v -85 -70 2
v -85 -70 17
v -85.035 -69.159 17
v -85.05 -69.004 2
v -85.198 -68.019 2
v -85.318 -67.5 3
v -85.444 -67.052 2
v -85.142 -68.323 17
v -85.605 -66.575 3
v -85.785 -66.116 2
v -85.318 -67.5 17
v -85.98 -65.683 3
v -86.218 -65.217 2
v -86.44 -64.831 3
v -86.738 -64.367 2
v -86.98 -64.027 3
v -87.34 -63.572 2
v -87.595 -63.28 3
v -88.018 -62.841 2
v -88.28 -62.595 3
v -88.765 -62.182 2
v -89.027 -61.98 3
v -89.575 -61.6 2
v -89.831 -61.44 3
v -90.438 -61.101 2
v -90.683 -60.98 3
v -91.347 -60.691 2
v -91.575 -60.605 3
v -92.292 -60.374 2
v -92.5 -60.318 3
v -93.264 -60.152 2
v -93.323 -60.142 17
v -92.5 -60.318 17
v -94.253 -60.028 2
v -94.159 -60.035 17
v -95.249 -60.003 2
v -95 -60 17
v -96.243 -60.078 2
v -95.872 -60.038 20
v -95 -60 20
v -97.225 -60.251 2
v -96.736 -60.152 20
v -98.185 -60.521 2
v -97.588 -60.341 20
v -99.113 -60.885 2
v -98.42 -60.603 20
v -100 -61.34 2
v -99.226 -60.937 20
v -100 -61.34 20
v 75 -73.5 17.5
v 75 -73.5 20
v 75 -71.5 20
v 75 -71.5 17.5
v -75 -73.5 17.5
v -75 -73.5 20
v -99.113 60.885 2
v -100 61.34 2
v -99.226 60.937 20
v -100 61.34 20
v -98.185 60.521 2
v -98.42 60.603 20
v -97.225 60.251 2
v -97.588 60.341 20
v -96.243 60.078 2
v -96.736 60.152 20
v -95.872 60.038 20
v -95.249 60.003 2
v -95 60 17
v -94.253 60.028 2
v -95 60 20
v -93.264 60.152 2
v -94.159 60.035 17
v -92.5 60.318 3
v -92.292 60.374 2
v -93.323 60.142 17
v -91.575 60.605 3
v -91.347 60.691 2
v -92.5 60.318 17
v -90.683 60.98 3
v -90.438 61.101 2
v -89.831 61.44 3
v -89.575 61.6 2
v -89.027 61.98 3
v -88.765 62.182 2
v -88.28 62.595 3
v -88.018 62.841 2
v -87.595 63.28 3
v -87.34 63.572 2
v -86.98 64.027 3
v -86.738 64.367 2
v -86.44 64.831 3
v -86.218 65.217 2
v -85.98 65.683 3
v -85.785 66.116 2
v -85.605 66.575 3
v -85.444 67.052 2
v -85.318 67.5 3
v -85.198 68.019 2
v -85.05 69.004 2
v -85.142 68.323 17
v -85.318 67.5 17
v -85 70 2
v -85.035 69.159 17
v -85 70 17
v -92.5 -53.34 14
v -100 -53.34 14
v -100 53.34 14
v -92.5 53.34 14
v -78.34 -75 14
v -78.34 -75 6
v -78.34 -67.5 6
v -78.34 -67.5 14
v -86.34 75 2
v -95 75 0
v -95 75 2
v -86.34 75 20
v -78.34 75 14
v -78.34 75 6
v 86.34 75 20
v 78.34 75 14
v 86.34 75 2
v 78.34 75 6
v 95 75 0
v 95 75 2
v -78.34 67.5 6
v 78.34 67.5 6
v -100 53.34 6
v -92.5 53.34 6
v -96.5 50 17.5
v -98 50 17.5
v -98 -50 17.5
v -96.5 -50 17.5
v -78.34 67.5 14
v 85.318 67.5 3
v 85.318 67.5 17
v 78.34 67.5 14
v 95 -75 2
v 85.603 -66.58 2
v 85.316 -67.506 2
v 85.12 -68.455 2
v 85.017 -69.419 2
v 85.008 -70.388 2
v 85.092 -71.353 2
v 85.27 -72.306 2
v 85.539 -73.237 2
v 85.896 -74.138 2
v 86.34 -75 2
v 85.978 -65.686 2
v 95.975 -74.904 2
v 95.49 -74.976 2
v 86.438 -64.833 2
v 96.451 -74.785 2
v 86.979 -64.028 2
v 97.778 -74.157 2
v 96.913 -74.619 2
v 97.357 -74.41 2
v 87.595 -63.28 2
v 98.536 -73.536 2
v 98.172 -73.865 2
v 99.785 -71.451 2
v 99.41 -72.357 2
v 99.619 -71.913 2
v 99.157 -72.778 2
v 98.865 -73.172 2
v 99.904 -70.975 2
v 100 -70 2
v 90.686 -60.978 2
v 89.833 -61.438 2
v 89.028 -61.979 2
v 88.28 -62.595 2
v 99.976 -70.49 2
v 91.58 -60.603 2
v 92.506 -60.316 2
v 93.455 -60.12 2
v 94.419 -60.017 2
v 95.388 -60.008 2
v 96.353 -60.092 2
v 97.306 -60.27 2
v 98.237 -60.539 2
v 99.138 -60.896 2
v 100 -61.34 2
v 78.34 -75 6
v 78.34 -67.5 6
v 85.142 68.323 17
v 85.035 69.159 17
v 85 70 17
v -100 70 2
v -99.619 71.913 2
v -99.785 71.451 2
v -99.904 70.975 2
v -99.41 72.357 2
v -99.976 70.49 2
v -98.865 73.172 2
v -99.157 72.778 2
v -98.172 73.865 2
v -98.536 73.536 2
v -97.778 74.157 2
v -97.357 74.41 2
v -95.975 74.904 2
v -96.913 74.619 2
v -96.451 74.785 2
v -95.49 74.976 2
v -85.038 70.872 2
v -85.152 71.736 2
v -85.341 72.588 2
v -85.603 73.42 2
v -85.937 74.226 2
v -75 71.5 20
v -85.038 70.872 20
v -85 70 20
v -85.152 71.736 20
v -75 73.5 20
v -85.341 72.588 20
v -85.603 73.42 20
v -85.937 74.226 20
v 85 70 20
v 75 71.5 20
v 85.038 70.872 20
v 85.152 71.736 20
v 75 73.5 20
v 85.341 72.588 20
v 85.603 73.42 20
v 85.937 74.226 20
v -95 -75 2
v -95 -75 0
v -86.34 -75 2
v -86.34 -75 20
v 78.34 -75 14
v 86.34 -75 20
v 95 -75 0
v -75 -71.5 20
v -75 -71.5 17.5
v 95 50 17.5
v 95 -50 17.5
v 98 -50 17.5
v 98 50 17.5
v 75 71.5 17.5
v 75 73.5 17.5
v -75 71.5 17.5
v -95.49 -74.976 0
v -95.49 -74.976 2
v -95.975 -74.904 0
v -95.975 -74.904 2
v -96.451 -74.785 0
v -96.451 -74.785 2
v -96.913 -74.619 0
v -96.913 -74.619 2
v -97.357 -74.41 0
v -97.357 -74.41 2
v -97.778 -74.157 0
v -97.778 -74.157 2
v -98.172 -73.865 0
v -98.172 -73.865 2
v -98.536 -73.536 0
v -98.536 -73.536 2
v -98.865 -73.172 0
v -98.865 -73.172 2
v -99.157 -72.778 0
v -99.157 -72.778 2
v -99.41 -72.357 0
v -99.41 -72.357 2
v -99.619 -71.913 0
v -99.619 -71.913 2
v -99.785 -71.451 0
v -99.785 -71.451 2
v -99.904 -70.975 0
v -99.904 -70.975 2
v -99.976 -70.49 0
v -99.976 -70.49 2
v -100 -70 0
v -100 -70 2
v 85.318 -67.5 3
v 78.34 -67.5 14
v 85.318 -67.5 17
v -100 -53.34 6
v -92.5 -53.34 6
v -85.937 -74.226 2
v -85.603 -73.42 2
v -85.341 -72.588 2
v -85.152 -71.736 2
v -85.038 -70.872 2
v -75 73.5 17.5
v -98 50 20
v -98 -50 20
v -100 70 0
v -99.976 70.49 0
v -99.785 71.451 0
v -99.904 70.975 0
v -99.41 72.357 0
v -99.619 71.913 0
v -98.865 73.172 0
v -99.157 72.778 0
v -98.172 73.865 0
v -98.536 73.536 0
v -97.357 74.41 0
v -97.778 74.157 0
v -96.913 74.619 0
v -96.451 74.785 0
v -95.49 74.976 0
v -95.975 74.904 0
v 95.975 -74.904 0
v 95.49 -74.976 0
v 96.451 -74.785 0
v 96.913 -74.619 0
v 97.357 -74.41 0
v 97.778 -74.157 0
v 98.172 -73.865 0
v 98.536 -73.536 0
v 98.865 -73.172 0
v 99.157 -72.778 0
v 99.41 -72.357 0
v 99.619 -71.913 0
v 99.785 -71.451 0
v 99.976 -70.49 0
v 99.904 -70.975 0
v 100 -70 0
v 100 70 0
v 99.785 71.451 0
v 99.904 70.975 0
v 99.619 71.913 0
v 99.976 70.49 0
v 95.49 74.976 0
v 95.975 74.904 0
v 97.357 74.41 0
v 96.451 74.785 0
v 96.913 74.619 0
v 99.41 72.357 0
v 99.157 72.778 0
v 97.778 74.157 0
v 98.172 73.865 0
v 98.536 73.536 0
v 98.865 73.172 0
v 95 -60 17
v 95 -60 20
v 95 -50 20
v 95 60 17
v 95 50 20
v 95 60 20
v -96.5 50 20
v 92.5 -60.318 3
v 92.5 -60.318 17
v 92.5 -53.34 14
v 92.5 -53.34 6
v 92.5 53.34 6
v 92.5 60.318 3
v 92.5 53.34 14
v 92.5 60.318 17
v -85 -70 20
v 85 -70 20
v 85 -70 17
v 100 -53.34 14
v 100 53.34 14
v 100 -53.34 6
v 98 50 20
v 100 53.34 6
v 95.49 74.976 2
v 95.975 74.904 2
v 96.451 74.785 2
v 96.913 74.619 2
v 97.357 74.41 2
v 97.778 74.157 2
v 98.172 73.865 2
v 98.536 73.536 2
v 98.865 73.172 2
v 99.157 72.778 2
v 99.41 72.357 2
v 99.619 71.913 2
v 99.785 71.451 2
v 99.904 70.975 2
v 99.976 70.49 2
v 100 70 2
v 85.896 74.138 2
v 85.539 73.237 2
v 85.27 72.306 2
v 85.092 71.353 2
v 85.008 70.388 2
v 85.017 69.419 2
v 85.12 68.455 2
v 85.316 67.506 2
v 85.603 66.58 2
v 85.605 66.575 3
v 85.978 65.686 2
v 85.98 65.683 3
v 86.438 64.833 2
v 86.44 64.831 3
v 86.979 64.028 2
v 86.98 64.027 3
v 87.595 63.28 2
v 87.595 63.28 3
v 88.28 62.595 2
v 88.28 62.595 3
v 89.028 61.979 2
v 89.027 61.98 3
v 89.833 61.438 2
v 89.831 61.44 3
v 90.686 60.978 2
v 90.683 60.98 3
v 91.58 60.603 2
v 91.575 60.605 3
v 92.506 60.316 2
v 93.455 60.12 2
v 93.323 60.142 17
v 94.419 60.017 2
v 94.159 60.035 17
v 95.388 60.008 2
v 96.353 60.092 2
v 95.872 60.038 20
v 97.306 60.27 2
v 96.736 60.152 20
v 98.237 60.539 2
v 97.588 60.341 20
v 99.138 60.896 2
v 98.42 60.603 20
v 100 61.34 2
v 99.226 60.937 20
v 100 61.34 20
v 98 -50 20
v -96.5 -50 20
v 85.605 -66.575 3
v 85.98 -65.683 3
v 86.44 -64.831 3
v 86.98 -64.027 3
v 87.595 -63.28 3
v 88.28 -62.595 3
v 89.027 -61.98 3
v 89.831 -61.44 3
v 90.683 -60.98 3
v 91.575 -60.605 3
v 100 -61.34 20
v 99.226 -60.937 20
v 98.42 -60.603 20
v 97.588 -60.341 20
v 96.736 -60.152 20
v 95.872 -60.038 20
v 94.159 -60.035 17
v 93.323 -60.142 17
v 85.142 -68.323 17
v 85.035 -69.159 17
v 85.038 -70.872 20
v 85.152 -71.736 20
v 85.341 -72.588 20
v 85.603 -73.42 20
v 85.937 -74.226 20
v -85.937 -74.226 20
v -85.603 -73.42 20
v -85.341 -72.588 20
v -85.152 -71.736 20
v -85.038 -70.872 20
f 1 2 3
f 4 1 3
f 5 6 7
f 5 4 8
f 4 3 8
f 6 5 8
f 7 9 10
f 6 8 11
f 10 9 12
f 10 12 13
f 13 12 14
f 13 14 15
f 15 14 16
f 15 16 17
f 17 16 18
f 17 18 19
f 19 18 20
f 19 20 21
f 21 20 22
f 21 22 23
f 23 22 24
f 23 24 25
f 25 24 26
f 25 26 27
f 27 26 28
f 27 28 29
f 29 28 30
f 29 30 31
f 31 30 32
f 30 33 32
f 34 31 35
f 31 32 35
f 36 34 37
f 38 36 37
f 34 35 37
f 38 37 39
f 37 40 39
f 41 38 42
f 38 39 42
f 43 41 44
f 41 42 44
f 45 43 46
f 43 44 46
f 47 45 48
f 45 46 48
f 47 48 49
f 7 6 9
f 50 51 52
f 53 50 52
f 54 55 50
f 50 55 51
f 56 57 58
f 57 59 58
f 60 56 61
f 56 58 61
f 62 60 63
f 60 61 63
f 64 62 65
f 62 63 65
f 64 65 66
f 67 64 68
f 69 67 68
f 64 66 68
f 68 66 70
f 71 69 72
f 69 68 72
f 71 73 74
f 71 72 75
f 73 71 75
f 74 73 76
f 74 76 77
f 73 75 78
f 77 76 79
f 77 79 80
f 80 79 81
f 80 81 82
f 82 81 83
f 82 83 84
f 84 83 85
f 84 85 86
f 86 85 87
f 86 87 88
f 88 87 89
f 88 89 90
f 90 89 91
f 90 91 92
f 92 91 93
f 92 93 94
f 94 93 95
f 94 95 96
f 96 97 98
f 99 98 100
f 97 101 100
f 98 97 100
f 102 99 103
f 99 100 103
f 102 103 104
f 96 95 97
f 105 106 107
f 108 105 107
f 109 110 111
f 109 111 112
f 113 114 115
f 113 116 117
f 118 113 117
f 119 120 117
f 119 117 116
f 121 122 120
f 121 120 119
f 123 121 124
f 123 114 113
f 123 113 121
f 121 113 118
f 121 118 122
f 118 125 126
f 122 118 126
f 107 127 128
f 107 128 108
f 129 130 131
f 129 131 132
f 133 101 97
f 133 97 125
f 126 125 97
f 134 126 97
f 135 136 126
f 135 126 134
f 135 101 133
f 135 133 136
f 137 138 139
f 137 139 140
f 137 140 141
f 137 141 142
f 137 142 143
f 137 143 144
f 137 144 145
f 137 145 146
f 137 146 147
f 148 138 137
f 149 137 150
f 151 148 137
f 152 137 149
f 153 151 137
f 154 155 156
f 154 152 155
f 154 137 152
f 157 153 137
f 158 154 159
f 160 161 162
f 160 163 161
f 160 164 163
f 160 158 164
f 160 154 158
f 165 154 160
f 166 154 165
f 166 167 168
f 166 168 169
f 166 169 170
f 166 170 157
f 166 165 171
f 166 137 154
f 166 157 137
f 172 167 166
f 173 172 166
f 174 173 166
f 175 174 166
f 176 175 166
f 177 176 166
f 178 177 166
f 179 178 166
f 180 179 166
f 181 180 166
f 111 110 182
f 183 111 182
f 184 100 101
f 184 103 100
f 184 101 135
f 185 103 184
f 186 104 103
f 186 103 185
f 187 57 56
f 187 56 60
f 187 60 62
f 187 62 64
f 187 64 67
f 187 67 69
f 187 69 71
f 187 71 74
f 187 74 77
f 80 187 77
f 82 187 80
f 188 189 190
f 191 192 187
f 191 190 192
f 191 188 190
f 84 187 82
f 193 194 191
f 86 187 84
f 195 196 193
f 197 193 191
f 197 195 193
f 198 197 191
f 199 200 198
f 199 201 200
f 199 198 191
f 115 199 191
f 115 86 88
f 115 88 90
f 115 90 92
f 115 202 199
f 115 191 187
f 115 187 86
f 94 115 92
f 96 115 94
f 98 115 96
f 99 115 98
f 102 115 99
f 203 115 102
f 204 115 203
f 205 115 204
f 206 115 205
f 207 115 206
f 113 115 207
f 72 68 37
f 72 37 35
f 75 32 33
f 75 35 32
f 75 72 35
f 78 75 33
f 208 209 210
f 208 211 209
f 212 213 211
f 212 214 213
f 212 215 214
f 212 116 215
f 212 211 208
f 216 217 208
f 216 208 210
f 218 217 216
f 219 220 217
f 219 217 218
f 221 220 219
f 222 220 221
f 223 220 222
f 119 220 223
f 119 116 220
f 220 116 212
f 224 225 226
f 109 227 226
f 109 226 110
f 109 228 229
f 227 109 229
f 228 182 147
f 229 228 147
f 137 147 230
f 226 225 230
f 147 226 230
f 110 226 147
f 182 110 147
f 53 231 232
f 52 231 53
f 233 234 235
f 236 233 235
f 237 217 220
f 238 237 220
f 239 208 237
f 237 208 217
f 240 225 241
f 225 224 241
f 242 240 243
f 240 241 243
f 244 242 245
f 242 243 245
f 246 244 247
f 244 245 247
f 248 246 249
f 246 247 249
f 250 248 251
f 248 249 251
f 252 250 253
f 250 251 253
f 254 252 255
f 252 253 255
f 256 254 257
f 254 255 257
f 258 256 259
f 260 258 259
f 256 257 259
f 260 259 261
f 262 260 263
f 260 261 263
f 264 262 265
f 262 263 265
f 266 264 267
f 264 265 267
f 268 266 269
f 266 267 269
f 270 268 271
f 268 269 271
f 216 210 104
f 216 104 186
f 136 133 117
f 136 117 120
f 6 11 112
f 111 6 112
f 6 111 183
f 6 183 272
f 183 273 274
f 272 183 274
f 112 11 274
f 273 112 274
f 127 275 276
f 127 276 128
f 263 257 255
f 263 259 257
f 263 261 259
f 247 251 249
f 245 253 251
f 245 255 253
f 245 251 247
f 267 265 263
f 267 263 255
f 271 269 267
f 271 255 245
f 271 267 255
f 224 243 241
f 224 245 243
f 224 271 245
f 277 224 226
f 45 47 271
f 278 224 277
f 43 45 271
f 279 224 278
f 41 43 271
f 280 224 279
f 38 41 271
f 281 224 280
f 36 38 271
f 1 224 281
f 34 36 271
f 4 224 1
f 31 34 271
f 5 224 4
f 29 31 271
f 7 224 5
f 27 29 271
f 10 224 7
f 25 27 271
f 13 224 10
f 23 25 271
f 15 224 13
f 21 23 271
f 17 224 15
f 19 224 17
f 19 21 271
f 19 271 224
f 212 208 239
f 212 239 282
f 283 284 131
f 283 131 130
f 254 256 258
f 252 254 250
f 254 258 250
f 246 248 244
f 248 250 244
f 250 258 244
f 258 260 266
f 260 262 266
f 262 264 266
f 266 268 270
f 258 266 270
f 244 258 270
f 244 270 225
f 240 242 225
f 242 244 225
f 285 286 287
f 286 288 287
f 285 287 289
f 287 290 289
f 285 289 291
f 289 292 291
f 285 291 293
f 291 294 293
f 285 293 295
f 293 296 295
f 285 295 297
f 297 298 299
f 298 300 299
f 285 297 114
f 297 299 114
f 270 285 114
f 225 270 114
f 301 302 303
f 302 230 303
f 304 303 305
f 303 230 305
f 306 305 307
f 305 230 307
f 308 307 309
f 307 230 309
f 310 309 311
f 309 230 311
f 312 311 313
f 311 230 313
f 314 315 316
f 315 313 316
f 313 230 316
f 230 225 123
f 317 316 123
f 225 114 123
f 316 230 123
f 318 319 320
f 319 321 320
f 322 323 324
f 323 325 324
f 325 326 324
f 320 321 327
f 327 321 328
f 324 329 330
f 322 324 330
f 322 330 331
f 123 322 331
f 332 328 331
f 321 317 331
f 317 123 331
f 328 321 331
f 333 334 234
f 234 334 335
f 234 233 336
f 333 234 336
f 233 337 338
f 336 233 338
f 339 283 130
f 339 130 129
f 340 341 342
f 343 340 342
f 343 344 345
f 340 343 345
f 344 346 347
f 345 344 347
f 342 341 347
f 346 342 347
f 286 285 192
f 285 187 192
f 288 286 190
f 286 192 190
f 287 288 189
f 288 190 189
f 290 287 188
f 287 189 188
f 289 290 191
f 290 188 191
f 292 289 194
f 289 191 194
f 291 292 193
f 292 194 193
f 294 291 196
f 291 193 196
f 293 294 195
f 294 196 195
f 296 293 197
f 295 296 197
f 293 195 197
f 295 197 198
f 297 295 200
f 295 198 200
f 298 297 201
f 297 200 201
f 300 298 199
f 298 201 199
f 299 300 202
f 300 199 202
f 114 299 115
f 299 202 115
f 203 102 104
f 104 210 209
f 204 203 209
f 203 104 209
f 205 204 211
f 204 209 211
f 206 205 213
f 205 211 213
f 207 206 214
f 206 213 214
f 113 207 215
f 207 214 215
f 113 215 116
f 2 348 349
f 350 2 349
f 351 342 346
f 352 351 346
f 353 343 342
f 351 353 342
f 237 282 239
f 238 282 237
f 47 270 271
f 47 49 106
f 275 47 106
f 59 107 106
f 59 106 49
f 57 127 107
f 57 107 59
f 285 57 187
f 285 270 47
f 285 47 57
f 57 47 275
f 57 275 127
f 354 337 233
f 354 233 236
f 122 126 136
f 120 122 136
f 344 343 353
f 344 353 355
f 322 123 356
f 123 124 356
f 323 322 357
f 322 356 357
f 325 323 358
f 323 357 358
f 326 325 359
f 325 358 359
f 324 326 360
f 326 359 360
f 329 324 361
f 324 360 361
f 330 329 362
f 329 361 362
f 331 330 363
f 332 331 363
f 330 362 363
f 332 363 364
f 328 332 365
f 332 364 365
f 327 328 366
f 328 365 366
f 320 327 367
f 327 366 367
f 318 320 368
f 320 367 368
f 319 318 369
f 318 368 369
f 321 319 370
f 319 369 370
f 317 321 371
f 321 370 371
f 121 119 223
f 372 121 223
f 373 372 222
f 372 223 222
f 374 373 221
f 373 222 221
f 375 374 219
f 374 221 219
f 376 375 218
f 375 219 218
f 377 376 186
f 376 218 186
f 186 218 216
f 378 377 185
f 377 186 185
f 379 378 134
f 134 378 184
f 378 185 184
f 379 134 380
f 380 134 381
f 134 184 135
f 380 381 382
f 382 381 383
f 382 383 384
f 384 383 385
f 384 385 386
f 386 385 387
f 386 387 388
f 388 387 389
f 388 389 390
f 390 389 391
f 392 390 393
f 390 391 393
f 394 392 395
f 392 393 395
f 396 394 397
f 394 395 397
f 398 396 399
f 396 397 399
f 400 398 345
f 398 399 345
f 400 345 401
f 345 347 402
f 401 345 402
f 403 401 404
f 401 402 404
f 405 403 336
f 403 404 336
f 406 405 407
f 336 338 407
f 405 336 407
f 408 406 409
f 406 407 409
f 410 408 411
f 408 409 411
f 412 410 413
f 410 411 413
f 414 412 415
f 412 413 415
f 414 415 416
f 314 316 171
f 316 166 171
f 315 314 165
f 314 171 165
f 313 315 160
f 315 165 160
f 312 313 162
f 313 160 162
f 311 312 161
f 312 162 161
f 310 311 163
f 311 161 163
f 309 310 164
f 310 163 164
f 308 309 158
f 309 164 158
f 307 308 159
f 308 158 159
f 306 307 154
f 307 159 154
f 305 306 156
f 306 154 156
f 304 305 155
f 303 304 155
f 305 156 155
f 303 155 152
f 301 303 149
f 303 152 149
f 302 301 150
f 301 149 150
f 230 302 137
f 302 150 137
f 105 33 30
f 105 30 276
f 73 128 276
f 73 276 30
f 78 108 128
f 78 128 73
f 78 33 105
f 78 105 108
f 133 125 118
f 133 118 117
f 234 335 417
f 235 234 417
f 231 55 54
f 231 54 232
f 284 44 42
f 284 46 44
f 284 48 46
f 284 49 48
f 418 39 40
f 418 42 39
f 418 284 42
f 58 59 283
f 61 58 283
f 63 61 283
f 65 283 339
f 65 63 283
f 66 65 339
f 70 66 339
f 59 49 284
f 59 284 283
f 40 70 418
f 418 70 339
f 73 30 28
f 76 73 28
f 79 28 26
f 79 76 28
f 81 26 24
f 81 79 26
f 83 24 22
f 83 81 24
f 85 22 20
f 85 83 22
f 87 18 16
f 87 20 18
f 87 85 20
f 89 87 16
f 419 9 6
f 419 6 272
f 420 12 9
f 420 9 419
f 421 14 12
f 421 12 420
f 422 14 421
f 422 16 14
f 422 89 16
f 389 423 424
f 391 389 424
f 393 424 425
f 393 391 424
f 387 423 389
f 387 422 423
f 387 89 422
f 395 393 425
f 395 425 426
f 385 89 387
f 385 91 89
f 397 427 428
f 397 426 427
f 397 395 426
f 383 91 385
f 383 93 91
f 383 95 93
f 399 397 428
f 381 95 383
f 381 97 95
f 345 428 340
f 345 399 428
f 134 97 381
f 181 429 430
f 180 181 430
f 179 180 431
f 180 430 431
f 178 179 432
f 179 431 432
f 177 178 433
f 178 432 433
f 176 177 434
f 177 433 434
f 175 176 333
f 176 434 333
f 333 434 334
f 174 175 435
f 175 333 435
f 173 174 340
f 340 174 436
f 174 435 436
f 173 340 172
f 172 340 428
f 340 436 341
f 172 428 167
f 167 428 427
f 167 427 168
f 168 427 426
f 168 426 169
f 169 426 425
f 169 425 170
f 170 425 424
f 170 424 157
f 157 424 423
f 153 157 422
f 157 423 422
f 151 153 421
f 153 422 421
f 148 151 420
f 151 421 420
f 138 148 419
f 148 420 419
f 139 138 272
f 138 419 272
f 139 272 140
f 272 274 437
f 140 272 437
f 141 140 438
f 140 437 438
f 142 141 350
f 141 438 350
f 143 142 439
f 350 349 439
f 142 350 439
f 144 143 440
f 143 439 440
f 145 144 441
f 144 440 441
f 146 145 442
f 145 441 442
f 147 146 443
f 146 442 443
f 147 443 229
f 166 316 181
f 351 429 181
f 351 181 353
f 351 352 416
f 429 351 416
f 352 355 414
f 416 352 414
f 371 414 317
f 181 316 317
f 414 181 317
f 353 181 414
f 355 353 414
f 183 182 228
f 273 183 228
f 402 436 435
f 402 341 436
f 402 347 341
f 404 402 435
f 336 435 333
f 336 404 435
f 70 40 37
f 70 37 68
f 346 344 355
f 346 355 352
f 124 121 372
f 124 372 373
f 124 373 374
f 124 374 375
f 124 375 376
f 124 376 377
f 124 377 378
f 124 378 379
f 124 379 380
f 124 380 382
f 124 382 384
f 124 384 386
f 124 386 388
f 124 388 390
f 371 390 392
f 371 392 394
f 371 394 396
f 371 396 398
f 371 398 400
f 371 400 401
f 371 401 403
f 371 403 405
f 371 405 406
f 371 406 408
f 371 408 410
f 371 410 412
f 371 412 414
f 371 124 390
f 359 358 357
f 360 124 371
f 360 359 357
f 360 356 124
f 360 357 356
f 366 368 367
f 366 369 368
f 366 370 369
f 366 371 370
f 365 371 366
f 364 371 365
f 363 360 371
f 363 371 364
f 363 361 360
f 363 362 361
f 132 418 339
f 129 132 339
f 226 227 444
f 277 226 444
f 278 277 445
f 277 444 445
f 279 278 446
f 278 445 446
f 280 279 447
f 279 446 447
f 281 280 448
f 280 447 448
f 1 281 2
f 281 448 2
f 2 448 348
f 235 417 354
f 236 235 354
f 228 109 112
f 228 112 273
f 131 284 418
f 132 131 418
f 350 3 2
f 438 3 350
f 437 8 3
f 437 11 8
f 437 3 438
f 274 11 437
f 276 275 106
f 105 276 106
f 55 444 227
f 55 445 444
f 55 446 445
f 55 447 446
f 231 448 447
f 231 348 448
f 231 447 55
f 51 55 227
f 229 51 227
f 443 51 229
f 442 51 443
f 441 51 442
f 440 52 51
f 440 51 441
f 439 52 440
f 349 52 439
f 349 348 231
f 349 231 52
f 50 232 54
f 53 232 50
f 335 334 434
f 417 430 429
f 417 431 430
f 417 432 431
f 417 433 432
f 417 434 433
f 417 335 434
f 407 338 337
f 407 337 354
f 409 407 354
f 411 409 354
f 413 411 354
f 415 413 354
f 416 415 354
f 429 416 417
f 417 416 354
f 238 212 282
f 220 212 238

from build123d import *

# Parameters (mm, degrees)
ESBO_O1_W                = 200
ESBO_O1_H                = 150
RESSALTO_EXTRUS_O1_DEPTH = 20
ESBO_O4_W                = 185
ESBO_O4_H                = 135
CORTE_EXTRUS_O2_DEPTH    = 17
ESBO_O3_W                = 190
ESBO_O3_H                = 140
CORTE_EXTRUS_O3_DEPTH    = 3
ESBO_O6_R                = 10
CORTE_EXTRUS_O4_DEPTH    = 18
FILETE4_R                = 5
FILETE5_R                = 5
FILETE6_R                = 5
FILETE7_R                = 5
ESBO_O7_W                = 156.679491924
ESBO_O7_H                = 8
CORTE_EXTRUS_O5_DEPTH    = 300
ESBO_O8_W                = 8
ESBO_O8_H                = 106.679491924
CORTE_EXTRUS_O6_DEPTH    = 300
ESBO_O15_W               = 1.5
ESBO_O15_H               = 100
ESBO_O15_W_2             = 150
ESBO_O15_H_2             = 2
ESBO_O15_W_3             = 3.5
CORTE_EXTRUS_O7_DEPTH    = 2.5


with BuildPart() as part:
    # Esboço1 → Ressalto-extrusão1 (new body)
    with BuildSketch(Plane.XY):
        Rectangle(ESBO_O1_W, ESBO_O1_H)
    extrude(amount=RESSALTO_EXTRUS_O1_DEPTH)

    # Esboço4 → Corte-extrusão2 (cut)
    with BuildSketch(Plane.XY.offset(20)):
        Rectangle(ESBO_O4_W, ESBO_O4_H)
    extrude(amount=-CORTE_EXTRUS_O2_DEPTH, mode=Mode.SUBTRACT)

    # Esboço3 → Corte-extrusão3 (cut)
    with BuildSketch(Plane.XY.offset(20)):
        Rectangle(ESBO_O3_W, ESBO_O3_H)
    extrude(amount=-CORTE_EXTRUS_O3_DEPTH, mode=Mode.SUBTRACT)

    # Esboço6 → Corte-extrusão4 (cut)
    with BuildSketch(Plane.XY.offset(20)):
        with Locations((-95, 70)):
            Circle(ESBO_O6_R)
        with Locations((95, 70)):
            Circle(ESBO_O6_R)
        with Locations((-95, -70)):
            Circle(ESBO_O6_R)
        with Locations((95, -70)):
            Circle(ESBO_O6_R)
    extrude(amount=-CORTE_EXTRUS_O4_DEPTH, mode=Mode.SUBTRACT)

    # Filete4
    filete4_edges = [part.edges().sort_by_distance(p)[0] for p in [
        (-100, 75, 1),
    ]]
    fillet(filete4_edges, radius=FILETE4_R)

    # Filete5
    filete5_edges = [part.edges().sort_by_distance(p)[0] for p in [
        (100, 75, 1),
    ]]
    fillet(filete5_edges, radius=FILETE5_R)

    # Filete6
    filete6_edges = [part.edges().sort_by_distance(p)[0] for p in [
        (100, -75, 1),
    ]]
    fillet(filete6_edges, radius=FILETE6_R)

    # Filete7
    filete7_edges = [part.edges().sort_by_distance(p)[0] for p in [
        (-100, -75, 1),
    ]]
    fillet(filete7_edges, radius=FILETE7_R)

    # Esboço7 → Corte-extrusão5 (cut)
    with BuildSketch(Plane.XZ.offset(75)):
        with Locations((0, 10)):
            Rectangle(ESBO_O7_W, ESBO_O7_H)
    extrude(amount=-CORTE_EXTRUS_O5_DEPTH, mode=Mode.SUBTRACT)

    # Esboço8 → Corte-extrusão6 (cut)
    with BuildSketch(Plane.ZY.offset(100)):
        with Locations((10, 0)):
            Rectangle(ESBO_O8_W, ESBO_O8_H)
    extrude(amount=-CORTE_EXTRUS_O6_DEPTH, mode=Mode.SUBTRACT)

    # Esboço15 → Corte-extrusão7 (cut)
    with BuildSketch(Plane.XY.offset(20)):
        with Locations((-97.25, 0)):
            Rectangle(ESBO_O15_W, ESBO_O15_H)
        with Locations((0, 72.5)):
            Rectangle(ESBO_O15_W_2, ESBO_O15_H_2)
        with Locations((0, -72.5)):
            Rectangle(ESBO_O15_W_2, ESBO_O15_H_2)
        with Locations((96.25, 0)):
            Rectangle(ESBO_O15_W_3, ESBO_O15_H)
    extrude(amount=-CORTE_EXTRUS_O7_DEPTH, mode=Mode.SUBTRACT)


solid = part.part
